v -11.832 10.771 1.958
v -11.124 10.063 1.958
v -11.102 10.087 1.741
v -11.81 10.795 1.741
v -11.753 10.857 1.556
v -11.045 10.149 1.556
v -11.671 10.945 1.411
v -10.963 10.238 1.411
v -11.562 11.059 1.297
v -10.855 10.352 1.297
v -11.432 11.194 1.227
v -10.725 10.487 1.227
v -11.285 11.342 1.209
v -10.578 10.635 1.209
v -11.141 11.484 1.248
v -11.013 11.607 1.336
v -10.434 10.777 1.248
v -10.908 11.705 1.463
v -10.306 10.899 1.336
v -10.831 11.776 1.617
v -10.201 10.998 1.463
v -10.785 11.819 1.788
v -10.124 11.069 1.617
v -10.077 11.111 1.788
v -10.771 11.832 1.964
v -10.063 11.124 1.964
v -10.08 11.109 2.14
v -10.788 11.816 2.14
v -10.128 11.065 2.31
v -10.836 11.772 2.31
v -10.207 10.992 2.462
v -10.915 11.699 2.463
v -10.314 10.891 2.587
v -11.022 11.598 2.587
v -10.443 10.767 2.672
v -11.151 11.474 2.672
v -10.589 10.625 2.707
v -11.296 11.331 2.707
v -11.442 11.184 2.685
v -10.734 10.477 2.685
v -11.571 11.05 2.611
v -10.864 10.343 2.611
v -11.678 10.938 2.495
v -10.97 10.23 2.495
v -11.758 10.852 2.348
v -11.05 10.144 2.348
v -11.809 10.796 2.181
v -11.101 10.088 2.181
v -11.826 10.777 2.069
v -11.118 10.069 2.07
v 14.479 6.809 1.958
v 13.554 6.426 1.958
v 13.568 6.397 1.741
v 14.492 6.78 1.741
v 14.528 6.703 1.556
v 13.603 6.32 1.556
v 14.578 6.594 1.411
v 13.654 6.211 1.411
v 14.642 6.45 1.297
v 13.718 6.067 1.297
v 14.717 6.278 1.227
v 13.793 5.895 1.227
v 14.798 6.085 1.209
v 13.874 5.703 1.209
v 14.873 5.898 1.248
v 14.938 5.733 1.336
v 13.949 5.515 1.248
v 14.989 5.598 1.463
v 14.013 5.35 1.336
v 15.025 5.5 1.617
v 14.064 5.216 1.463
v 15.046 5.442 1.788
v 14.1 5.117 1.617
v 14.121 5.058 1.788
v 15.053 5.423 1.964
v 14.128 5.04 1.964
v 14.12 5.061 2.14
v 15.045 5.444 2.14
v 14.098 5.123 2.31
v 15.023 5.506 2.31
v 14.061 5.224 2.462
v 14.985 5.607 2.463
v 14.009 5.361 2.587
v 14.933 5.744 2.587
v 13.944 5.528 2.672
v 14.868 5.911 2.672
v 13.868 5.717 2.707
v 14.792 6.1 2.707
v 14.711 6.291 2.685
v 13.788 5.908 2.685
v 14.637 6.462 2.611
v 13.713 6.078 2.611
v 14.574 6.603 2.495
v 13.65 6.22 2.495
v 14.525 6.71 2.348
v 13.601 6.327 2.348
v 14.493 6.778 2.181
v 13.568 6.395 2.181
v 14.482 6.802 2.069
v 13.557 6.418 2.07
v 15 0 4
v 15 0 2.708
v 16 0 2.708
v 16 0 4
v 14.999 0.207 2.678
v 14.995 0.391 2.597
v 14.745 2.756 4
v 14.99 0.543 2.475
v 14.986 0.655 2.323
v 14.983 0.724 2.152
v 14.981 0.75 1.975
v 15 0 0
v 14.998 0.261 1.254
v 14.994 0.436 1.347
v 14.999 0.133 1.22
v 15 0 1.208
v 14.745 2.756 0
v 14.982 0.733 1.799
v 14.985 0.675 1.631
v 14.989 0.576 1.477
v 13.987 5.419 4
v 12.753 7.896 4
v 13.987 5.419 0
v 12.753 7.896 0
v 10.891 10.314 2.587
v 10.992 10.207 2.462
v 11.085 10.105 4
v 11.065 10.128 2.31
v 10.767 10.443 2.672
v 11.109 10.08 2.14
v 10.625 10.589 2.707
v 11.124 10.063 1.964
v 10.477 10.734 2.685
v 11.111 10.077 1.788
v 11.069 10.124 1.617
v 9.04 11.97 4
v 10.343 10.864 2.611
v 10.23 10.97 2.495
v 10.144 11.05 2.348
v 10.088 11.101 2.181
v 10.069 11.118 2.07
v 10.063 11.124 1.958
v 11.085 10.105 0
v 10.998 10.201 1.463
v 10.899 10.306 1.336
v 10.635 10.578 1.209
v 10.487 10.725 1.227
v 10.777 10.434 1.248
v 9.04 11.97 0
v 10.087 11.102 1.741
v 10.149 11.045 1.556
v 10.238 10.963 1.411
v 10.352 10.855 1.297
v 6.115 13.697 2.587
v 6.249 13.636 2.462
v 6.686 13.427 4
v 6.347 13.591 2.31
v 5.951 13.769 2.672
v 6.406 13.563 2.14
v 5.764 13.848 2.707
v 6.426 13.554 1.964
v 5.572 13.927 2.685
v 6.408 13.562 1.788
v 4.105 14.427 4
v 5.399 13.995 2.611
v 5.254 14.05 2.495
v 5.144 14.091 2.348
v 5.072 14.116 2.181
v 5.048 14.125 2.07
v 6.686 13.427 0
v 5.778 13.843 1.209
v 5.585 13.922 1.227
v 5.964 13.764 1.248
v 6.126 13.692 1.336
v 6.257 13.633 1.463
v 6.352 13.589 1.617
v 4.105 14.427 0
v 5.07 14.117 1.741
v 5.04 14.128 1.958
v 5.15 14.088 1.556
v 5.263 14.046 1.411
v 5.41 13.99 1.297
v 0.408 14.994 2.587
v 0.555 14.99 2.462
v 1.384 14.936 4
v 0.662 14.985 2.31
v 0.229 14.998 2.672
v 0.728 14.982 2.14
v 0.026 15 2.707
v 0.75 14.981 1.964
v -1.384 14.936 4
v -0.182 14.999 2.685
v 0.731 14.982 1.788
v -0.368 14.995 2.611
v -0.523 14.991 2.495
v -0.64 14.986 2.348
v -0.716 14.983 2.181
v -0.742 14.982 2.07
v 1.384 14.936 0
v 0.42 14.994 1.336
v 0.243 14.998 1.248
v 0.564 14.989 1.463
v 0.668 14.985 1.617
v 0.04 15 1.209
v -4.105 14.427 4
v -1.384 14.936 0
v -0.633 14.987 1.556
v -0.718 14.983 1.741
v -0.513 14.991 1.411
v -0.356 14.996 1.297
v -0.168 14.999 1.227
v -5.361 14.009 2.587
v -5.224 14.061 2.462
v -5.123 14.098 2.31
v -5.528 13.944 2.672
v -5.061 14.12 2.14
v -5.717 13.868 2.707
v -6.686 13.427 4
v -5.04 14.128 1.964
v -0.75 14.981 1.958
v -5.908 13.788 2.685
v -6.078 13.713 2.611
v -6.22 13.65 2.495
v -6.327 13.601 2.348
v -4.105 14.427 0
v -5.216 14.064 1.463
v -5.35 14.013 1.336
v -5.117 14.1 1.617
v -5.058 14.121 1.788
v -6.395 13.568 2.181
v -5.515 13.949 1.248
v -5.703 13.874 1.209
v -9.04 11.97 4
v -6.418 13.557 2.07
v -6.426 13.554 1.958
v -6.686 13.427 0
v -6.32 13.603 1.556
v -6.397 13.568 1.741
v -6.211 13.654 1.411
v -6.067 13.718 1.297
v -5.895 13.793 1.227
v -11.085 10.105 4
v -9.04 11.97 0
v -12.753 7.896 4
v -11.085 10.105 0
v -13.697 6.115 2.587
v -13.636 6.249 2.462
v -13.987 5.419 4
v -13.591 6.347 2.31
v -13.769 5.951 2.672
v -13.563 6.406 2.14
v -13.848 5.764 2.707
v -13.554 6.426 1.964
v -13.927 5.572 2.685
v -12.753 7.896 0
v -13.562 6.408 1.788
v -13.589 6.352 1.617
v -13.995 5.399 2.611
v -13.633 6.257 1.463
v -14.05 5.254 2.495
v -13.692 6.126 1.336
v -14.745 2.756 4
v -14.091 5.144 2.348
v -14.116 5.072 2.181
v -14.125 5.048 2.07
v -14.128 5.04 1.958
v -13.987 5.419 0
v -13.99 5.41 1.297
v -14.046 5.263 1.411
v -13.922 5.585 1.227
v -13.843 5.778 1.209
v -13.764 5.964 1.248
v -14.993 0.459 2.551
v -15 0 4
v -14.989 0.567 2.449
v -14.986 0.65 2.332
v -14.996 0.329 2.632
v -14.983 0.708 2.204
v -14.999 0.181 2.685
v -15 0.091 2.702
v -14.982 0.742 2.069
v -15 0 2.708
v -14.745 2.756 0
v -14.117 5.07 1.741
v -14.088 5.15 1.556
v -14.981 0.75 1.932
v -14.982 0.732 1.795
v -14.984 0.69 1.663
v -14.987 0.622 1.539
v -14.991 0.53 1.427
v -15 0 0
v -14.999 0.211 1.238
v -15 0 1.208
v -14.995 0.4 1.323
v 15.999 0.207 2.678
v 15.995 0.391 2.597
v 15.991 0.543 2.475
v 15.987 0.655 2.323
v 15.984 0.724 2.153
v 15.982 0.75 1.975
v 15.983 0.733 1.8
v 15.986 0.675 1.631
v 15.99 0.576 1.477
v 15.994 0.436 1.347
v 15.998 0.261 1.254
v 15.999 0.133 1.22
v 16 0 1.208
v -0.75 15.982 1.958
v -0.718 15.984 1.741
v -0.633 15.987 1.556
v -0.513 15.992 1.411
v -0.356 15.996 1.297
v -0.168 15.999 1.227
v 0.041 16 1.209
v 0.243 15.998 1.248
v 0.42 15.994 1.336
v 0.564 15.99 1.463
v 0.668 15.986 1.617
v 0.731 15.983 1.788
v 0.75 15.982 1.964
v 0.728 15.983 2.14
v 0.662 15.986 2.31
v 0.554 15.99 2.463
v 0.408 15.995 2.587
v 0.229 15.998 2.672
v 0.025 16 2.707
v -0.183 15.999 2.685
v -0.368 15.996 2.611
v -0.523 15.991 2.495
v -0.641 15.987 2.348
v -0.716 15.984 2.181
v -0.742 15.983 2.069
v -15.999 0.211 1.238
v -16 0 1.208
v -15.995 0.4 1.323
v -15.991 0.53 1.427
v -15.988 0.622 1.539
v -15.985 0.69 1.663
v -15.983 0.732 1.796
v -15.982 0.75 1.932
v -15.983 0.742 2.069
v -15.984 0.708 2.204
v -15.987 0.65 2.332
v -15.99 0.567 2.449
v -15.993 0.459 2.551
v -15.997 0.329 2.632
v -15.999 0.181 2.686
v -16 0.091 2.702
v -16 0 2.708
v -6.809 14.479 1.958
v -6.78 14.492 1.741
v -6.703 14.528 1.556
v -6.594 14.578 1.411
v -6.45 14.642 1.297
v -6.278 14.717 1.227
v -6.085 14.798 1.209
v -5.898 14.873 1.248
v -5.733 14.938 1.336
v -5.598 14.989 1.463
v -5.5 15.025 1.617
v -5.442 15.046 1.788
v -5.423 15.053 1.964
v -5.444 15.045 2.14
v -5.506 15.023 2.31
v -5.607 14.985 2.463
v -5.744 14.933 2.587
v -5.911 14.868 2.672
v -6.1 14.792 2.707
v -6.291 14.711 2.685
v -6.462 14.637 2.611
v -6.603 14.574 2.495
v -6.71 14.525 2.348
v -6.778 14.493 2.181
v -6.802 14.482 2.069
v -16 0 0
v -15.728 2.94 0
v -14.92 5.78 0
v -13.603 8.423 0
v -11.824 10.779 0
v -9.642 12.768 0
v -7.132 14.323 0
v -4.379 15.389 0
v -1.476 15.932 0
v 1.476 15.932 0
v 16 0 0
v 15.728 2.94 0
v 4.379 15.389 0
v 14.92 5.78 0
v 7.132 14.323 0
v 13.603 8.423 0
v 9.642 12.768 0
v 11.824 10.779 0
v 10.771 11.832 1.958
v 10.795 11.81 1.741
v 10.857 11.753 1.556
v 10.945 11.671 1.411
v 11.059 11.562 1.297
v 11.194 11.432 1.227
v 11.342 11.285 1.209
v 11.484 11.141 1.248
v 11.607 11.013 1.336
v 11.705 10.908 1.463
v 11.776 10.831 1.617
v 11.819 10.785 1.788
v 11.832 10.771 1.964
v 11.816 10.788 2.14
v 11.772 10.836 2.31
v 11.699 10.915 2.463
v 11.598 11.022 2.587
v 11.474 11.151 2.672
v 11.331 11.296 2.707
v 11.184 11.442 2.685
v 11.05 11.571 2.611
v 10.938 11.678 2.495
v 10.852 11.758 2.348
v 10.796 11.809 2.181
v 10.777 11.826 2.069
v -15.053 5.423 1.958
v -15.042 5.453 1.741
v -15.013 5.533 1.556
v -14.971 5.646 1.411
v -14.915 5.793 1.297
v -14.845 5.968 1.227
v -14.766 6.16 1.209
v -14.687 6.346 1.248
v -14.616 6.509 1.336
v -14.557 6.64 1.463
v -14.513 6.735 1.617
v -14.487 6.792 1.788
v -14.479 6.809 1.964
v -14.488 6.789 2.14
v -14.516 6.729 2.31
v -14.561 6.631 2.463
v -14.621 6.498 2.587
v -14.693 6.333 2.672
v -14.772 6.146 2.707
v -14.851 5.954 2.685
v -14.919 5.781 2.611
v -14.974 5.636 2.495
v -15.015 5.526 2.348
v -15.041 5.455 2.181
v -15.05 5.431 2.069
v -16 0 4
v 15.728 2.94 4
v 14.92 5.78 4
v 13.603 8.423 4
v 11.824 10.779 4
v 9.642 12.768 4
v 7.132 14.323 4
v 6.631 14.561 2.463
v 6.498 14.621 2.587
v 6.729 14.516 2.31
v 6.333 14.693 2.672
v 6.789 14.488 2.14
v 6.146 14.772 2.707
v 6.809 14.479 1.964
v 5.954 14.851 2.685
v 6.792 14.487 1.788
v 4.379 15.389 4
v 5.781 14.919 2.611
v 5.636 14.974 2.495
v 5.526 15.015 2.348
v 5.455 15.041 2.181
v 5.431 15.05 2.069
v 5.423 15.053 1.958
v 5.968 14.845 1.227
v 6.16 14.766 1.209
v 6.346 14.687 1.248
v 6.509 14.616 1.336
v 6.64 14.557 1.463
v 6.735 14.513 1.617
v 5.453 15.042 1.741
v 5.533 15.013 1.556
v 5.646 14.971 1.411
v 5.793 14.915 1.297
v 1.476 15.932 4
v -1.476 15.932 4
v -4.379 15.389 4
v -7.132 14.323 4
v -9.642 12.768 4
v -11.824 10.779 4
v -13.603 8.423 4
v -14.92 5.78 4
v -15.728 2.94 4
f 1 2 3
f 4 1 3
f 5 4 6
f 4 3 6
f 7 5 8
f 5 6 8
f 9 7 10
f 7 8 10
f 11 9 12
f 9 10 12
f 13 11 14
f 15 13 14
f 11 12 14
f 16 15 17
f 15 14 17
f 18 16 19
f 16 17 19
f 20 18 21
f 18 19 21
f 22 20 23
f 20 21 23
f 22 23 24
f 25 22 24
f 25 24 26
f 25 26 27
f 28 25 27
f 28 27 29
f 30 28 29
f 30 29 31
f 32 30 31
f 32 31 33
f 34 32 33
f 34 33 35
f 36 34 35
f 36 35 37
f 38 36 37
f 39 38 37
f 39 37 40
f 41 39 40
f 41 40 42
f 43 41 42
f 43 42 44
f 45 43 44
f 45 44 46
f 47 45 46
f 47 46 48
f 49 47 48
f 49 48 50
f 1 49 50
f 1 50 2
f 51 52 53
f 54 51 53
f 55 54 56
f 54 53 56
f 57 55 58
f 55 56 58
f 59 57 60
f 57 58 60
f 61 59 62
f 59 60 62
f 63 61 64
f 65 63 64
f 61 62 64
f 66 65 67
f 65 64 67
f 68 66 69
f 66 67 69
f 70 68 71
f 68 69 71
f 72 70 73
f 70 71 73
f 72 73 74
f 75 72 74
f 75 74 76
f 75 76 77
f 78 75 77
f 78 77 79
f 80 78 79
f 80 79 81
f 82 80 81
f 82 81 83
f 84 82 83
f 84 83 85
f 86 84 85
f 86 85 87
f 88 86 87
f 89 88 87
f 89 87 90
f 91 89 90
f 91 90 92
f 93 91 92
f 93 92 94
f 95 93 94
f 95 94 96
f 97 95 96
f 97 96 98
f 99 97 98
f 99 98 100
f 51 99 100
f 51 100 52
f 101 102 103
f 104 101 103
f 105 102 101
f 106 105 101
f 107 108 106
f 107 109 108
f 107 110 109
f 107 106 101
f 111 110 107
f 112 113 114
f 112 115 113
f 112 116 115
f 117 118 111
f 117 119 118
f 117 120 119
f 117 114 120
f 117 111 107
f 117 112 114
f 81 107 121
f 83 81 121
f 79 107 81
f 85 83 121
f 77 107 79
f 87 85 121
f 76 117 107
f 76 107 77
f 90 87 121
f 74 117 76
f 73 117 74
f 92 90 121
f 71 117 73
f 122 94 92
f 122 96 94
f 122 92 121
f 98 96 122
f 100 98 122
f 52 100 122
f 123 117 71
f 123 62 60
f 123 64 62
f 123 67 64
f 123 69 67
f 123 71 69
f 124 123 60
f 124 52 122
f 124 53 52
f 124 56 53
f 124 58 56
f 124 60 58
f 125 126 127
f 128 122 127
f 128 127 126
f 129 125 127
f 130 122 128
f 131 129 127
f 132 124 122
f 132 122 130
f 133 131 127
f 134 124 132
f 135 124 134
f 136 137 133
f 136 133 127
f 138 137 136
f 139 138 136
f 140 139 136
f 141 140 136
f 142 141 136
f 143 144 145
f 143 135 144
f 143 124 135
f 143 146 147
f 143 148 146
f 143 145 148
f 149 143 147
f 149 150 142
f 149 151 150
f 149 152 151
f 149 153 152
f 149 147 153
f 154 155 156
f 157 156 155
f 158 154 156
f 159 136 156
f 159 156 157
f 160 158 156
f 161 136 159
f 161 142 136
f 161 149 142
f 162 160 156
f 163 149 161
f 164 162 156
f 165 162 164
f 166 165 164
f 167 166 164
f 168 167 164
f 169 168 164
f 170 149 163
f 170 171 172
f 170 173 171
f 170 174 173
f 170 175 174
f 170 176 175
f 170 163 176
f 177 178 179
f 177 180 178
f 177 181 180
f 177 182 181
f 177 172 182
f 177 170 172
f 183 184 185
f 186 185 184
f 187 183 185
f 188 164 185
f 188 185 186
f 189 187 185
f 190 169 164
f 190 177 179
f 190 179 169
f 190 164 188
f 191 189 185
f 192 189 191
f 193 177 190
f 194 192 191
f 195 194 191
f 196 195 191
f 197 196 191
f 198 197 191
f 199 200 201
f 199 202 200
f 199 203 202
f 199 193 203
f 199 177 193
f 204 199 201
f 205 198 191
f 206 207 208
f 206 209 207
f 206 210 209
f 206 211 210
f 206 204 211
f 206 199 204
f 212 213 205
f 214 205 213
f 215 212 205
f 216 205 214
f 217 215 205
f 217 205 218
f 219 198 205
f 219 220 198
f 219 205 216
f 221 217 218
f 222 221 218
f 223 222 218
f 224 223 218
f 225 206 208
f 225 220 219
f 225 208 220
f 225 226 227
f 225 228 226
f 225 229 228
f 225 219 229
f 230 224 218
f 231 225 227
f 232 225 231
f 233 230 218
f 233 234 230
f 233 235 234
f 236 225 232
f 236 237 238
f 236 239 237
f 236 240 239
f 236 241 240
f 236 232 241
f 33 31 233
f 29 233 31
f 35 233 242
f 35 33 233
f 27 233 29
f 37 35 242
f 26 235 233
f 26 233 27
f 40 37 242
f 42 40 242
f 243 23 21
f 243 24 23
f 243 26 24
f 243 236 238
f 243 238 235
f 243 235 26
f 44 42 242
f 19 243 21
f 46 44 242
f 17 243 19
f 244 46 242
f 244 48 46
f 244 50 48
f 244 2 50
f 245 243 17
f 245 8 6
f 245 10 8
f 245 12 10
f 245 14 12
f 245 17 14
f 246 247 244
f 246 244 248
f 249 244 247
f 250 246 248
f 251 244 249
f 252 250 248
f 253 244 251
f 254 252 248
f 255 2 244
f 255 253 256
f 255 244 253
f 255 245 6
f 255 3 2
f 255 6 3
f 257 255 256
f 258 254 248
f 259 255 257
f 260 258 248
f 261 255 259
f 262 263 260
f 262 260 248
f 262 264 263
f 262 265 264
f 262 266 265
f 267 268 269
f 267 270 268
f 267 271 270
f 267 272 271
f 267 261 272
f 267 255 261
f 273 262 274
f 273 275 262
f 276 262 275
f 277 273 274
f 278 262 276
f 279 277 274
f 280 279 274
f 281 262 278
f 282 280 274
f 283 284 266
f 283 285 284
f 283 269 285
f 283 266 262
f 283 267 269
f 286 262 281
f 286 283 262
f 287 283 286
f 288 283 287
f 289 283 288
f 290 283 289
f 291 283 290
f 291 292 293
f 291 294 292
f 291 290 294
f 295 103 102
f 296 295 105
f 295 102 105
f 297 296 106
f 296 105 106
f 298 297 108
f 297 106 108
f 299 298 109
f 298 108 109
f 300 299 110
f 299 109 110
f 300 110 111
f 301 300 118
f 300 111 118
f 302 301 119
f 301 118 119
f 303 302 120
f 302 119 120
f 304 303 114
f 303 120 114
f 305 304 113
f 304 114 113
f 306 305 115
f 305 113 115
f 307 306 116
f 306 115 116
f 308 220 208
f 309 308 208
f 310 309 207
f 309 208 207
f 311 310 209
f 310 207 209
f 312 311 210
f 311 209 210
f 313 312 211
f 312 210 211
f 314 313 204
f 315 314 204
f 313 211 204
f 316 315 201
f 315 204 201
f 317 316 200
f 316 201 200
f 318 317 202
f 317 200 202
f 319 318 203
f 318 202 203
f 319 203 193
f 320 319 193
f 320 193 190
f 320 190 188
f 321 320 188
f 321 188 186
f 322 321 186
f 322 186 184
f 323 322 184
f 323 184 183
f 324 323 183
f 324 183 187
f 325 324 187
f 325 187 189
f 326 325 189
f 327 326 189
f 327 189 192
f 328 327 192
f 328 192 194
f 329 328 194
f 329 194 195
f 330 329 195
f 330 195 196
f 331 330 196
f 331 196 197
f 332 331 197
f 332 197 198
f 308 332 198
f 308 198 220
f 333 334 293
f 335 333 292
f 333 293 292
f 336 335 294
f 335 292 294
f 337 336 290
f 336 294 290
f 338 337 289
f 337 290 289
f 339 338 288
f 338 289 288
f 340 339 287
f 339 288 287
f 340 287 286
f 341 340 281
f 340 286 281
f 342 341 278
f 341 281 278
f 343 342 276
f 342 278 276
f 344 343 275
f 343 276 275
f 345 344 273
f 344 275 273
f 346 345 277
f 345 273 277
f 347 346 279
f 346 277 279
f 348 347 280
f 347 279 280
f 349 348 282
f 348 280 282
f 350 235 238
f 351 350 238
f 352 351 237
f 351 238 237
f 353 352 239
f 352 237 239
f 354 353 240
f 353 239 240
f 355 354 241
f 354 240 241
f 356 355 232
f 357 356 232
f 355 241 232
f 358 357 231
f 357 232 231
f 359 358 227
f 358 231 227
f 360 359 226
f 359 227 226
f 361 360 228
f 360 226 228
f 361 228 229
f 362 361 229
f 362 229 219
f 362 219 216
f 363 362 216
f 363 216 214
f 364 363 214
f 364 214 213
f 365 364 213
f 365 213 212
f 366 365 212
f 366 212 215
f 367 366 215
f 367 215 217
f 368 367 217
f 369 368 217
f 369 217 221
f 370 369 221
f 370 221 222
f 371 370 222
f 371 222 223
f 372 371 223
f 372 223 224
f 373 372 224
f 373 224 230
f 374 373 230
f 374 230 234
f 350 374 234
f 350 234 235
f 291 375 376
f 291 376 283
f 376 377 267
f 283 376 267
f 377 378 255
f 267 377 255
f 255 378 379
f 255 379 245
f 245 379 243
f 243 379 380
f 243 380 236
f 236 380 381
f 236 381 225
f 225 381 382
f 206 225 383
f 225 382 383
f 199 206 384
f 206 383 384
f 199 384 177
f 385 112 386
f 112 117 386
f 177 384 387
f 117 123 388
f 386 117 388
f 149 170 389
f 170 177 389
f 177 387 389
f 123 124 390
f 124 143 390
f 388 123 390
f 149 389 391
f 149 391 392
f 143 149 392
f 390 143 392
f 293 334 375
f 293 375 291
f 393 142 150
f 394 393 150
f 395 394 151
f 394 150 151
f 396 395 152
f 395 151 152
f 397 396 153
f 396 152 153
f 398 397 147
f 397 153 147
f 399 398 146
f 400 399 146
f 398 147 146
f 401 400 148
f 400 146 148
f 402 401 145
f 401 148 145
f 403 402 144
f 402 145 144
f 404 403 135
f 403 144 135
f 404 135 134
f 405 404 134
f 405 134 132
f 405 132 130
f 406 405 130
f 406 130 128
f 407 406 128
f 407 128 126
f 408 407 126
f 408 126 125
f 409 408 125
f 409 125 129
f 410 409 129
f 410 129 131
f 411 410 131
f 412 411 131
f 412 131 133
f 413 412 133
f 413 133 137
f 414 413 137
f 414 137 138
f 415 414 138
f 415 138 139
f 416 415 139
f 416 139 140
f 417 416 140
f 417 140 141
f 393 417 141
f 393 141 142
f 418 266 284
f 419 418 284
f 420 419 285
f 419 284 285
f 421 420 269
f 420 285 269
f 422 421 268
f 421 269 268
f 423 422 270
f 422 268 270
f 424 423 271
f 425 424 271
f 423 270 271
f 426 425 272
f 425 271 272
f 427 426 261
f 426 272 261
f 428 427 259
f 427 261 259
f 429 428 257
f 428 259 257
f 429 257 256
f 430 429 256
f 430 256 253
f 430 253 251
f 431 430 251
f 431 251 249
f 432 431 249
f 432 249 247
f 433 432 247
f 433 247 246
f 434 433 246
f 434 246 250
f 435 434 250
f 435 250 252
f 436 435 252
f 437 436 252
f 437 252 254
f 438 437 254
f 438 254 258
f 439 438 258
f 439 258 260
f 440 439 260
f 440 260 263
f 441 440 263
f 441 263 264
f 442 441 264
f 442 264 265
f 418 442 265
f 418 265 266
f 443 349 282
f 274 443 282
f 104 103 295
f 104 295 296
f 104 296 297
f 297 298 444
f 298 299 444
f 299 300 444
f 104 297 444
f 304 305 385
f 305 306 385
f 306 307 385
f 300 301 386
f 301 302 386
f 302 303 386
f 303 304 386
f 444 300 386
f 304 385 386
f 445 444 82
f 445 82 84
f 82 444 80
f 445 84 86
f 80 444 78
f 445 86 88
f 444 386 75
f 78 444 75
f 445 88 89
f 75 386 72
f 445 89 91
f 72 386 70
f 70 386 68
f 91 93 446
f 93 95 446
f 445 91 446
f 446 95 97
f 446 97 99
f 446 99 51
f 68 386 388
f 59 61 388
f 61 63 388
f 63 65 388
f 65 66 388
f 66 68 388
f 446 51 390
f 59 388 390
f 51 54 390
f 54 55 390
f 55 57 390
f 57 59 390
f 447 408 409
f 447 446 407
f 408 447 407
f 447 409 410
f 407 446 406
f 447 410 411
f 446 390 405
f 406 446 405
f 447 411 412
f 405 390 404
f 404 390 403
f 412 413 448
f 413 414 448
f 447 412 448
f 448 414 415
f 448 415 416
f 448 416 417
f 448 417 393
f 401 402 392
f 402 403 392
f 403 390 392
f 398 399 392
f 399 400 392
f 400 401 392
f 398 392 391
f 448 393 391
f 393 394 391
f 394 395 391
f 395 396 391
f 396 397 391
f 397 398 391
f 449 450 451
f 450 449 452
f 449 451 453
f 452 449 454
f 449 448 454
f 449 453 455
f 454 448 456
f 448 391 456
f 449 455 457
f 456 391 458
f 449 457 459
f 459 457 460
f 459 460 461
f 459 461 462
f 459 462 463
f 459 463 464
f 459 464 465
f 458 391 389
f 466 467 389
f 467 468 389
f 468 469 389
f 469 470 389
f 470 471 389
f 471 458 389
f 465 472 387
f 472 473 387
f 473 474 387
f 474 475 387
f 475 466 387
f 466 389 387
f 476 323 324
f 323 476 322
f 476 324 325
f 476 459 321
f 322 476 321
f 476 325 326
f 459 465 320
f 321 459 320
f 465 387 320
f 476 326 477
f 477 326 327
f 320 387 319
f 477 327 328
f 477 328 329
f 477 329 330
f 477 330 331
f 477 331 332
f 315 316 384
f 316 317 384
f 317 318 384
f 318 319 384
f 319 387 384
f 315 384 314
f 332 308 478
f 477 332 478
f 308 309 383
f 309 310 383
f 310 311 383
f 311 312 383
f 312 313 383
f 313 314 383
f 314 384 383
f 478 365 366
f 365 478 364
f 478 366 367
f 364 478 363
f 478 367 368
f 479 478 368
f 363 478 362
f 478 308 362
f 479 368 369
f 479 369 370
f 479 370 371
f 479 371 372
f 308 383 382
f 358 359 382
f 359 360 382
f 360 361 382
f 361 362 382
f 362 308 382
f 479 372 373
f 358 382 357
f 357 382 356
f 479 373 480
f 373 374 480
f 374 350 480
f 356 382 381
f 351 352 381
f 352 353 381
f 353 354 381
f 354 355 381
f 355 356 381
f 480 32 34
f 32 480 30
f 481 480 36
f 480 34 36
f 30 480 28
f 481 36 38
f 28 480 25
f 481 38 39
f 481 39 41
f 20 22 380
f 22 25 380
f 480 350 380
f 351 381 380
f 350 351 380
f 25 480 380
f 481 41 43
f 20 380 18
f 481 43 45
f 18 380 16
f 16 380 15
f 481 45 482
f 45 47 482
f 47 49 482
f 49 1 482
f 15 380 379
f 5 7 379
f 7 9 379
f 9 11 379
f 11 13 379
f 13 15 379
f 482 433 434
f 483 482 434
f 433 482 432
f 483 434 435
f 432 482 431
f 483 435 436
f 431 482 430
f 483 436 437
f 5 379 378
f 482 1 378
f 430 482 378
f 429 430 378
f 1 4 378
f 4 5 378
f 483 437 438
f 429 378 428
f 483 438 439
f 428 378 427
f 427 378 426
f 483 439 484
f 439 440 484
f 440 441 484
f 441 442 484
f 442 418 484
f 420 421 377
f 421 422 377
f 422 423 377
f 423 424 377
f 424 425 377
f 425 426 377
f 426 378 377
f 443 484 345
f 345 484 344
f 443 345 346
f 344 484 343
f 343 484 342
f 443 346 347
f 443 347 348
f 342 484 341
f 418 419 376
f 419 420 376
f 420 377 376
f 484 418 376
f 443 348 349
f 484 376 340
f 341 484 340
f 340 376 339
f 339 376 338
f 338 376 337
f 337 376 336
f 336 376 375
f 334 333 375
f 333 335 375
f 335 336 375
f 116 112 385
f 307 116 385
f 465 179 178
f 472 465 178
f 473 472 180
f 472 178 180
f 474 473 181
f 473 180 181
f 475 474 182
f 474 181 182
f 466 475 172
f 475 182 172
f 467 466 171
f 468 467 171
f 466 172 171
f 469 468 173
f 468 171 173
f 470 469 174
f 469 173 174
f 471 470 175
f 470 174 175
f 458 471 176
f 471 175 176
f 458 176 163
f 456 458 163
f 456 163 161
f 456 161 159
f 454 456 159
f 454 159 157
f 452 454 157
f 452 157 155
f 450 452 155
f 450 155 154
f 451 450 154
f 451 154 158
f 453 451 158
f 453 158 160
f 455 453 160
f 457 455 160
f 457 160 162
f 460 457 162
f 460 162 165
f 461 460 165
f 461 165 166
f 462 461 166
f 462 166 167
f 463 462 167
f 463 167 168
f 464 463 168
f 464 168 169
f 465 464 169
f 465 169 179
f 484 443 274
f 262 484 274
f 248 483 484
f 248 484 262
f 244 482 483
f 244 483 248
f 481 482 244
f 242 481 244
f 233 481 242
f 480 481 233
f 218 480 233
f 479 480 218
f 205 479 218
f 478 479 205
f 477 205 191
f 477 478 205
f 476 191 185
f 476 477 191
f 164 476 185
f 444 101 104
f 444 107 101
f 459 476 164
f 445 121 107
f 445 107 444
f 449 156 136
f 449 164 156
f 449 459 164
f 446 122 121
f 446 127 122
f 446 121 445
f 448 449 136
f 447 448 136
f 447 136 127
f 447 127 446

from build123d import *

# Parameters (mm, degrees)
SKETCH_1_R               = 16
SKETCH_1_R_2             = 15
EXTRUDE_1_DEPTH          = 4
SKETCH_2_R               = 0.75
CUT_EXTRUDE_1_DEPTH      = 17
PATTERN_CIRCULAR_1_COUNT = 16
SKETCH_3_W               = 36.79853237
SKETCH_3_H               = 11.94610836
CUT_EXTRUDE_2_DEPTH      = 17.0000001


with BuildPart() as part:
    # ｽｹｯﾁ1 → ﾎﾞｽ - 押し出し1 (new body)
    with BuildSketch(Plane.XY):
        Circle(SKETCH_1_R)
        Circle(SKETCH_1_R_2, mode=Mode.SUBTRACT)
    extrude(amount=EXTRUDE_1_DEPTH)

    # ｽｹｯﾁ2 → ｶｯﾄ - 押し出し1 (cut, through all)
    with BuildSketch(Plane(origin=(0, 0, 0), x_dir=(1, 0, 0), z_dir=(0, 1, 0))):
        with Locations((0, -1.957637914)):
            Circle(SKETCH_2_R)
    cut_extrude_1 = extrude(amount=-CUT_EXTRUDE_1_DEPTH, mode=Mode.SUBTRACT)

    # 円形ﾊﾟﾀｰﾝ1: ｶｯﾄ - 押し出し1 ×16 about axis
    pattern_circular_1_axis = Axis((0, 0, 0), (0, 0, 1))
    for i in range(1, PATTERN_CIRCULAR_1_COUNT):
        add(cut_extrude_1.rotate(pattern_circular_1_axis, i * 360 / PATTERN_CIRCULAR_1_COUNT), mode=Mode.SUBTRACT)

    # ｽｹｯﾁ3 → ｶｯﾄ - 押し出し2 (cut, through all)
    with BuildSketch(Plane(origin=(0, 0, 0), x_dir=(1, 0, 0), z_dir=(0, 1, 0))):
        with Locations((0, -2.028241391)):
            Rectangle(SKETCH_3_W, SKETCH_3_H)
    extrude(amount=-CUT_EXTRUDE_2_DEPTH, mode=Mode.SUBTRACT)


solid = part.part
